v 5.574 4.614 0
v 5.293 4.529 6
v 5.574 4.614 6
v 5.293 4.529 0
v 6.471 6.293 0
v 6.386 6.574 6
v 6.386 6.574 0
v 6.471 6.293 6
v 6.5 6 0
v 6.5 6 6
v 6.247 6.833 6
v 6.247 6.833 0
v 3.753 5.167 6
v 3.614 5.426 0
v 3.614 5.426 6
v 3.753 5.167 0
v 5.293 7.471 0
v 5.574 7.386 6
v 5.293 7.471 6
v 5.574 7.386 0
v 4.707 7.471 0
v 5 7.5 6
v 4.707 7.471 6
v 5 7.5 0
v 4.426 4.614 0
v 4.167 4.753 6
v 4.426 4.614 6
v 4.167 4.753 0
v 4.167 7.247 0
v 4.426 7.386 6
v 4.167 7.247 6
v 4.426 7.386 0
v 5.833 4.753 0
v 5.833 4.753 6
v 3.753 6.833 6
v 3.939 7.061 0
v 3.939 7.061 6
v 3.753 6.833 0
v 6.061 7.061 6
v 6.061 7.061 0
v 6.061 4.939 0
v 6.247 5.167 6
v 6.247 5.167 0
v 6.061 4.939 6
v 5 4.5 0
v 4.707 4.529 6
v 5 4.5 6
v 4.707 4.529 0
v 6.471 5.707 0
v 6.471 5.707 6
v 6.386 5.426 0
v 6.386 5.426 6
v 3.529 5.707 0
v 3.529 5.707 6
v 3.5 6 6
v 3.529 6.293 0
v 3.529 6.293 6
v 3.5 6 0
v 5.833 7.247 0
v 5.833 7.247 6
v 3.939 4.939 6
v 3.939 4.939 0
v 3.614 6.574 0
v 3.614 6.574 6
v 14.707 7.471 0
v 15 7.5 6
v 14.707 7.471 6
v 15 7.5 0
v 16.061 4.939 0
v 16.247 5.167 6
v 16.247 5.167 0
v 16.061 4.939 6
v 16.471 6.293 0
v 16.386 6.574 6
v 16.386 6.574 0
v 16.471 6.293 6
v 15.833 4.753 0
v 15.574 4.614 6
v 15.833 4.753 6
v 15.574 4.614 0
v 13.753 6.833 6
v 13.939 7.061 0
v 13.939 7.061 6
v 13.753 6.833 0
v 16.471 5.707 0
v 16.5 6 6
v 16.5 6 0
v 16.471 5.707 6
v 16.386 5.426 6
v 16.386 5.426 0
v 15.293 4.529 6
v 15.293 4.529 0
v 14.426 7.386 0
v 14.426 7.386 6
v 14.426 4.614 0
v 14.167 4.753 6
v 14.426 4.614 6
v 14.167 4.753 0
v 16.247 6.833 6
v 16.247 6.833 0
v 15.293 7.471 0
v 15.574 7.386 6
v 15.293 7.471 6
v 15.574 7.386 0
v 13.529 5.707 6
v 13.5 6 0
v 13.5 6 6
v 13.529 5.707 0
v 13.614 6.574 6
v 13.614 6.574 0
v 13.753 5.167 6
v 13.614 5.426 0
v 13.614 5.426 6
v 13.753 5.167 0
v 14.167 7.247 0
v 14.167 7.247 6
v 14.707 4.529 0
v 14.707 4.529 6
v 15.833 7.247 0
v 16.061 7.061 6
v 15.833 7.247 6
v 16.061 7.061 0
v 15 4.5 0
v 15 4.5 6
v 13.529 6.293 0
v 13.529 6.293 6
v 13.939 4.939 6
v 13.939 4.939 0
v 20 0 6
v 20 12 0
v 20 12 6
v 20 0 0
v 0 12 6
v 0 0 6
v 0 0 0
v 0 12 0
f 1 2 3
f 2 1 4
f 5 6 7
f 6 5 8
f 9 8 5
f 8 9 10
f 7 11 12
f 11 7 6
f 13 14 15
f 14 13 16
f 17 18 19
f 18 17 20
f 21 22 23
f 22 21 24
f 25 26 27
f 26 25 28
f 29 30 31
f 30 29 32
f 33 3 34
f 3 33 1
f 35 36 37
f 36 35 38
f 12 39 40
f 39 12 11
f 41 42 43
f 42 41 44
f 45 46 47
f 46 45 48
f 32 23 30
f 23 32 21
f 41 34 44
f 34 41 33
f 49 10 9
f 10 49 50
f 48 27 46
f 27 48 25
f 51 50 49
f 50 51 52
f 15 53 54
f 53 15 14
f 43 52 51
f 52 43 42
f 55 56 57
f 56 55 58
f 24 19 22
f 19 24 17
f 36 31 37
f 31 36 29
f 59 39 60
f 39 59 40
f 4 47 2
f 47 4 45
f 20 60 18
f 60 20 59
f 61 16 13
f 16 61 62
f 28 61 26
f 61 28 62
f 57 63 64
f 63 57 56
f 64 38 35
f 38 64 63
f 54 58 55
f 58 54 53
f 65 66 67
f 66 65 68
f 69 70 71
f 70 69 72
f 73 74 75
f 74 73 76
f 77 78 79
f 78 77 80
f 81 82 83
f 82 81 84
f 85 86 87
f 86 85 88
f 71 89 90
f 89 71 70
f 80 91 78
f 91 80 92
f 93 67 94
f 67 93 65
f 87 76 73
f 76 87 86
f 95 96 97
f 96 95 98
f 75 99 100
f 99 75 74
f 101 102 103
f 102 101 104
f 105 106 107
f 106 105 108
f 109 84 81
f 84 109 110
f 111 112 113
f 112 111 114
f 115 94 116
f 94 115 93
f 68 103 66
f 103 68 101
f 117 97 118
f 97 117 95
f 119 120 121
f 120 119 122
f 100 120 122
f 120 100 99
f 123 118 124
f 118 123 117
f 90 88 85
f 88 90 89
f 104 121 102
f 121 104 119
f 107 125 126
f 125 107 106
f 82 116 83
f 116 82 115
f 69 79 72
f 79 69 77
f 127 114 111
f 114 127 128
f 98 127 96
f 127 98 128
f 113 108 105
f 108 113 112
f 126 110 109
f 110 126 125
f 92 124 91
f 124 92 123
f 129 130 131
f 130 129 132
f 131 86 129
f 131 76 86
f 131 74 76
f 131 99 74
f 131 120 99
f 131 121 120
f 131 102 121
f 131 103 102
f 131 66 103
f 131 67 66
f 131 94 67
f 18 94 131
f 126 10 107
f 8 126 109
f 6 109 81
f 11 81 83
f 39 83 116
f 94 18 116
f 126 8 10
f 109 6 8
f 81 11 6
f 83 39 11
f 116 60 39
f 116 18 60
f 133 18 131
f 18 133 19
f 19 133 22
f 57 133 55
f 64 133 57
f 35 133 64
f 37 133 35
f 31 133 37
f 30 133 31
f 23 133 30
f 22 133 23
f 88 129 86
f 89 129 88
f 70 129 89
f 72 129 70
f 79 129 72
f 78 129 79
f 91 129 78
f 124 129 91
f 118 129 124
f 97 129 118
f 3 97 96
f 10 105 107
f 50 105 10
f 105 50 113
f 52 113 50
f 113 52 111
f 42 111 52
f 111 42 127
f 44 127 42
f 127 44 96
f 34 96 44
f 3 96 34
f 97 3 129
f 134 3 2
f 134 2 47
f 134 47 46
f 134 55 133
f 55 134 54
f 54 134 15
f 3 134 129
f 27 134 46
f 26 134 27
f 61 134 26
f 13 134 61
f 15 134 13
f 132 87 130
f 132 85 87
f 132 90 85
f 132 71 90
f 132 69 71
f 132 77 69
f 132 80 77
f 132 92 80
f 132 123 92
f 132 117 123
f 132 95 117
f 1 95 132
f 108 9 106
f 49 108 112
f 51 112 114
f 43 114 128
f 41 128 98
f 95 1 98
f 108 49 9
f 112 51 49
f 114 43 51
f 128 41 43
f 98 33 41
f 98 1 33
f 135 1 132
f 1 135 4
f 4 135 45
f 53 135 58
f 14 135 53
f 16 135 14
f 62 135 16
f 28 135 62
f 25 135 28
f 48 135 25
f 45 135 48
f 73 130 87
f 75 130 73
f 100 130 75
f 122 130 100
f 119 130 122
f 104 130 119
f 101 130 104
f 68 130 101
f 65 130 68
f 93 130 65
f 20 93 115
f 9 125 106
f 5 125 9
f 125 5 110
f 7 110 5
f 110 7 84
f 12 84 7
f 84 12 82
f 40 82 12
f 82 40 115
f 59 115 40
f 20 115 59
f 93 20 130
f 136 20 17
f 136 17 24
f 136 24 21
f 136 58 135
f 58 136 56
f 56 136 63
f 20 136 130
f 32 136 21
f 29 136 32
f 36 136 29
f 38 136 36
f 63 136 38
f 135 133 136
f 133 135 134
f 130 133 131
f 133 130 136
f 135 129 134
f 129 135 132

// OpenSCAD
$fn = 32;

// ----------------------------------------------------------------------
// Micro pad: two-hole pad, 5-20 mm class
// ----------------------------------------------------------------------

// --- parameters (mm) ---
pad_l = 20;               // pad length, X
pad_w = 12;               // pad width, Y
pad_t = 6;                // pad thickness, Z
hole_d = 3;               // hole diameter
hole_x = 5;               // X of the first hole centre

difference() {
  cube([pad_l, pad_w, pad_t]);
  for (x = [hole_x, pad_l - hole_x])
    translate([x, pad_w / 2, -1])
      cylinder(h = pad_t + 2, d = hole_d);
}
